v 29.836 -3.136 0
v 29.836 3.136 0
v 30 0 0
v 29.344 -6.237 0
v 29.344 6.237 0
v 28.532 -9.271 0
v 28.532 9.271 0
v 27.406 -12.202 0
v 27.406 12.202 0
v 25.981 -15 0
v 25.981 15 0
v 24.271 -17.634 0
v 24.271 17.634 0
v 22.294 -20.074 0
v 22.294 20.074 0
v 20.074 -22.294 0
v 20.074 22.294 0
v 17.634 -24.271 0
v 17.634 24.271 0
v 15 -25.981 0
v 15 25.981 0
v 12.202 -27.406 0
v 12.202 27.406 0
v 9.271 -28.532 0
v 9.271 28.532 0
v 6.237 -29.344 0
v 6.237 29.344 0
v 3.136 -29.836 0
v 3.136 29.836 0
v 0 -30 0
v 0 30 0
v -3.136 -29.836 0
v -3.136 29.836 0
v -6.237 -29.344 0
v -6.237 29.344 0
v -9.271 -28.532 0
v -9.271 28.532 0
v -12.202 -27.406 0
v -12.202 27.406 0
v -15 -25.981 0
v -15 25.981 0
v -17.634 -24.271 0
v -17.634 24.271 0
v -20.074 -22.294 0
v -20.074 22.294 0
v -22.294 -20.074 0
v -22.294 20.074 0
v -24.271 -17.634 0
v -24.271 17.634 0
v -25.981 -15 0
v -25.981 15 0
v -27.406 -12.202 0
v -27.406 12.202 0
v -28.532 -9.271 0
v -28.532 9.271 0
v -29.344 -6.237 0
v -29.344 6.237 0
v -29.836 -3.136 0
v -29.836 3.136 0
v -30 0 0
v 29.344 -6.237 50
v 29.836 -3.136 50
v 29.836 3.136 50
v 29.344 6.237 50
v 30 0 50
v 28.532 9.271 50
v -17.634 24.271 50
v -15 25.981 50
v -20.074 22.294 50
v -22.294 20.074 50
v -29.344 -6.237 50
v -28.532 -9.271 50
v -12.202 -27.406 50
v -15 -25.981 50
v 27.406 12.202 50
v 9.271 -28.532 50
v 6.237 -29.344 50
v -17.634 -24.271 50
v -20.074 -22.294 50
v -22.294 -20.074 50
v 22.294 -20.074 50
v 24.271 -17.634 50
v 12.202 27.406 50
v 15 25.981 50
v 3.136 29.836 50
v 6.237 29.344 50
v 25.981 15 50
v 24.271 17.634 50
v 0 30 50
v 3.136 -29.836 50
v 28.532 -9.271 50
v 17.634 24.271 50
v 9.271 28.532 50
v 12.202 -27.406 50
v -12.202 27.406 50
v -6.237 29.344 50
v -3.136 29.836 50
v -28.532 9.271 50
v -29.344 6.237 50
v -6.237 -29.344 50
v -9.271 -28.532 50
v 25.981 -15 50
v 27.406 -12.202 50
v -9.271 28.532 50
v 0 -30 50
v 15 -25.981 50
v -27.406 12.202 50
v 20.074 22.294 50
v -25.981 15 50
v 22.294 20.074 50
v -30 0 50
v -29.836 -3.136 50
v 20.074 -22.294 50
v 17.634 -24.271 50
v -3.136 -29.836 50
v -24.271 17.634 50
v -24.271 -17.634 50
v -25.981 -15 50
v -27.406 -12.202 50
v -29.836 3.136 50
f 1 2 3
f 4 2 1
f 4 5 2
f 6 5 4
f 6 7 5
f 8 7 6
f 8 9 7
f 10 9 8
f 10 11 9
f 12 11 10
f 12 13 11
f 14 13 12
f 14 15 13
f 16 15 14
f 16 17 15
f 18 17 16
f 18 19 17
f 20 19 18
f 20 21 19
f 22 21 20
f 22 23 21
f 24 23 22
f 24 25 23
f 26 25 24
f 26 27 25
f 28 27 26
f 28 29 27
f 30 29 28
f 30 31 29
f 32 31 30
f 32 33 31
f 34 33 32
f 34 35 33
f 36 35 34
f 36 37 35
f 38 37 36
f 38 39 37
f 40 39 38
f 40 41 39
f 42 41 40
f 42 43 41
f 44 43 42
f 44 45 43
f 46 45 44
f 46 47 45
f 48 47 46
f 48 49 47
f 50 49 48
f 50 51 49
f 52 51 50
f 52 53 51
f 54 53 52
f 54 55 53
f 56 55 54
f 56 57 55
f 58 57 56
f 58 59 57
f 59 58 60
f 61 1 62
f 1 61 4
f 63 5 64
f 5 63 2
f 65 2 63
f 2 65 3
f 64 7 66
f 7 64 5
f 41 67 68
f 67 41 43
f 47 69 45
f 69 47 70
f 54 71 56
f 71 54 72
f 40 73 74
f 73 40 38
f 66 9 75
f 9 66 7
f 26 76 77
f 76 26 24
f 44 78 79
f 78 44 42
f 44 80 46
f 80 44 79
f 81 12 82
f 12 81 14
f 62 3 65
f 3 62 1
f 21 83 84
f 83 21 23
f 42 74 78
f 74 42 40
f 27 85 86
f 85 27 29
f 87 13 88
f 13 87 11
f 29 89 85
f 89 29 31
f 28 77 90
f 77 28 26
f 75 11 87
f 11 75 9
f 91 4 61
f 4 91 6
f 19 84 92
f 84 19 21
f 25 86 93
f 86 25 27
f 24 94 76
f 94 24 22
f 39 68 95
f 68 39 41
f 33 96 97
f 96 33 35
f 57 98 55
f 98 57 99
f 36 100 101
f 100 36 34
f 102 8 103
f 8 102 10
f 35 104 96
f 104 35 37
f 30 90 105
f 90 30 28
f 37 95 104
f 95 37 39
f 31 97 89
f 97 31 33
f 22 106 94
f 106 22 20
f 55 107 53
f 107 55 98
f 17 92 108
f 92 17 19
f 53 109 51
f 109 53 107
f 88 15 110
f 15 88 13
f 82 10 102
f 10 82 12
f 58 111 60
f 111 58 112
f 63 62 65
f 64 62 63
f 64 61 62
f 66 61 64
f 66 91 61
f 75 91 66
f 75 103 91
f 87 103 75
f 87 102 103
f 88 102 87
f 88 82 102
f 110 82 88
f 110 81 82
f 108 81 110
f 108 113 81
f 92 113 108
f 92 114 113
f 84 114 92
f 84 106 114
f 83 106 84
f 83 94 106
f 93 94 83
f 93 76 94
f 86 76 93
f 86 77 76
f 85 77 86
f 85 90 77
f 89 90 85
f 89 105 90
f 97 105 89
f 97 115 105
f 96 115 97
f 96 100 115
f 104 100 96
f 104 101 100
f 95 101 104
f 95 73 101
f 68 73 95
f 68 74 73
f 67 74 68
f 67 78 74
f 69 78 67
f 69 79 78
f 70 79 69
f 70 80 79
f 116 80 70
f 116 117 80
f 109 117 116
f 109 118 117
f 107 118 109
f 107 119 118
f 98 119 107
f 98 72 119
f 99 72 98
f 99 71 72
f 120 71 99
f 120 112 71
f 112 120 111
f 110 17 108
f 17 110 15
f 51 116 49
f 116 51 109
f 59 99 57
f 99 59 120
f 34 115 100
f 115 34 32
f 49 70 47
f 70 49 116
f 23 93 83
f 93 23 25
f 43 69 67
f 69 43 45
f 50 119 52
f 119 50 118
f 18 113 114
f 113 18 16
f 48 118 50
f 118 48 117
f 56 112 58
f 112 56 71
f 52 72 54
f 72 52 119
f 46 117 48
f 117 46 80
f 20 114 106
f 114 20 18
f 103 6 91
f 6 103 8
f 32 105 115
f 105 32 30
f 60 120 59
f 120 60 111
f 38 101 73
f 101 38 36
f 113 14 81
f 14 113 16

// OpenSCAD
module screw(type = 2, r1 = 15, r2 = 20, n = 7, h = 100, t = 8)
{
	
	//			translate([-h/2,0,0]){
	linear_extrude(height = h, twist = 360*t/n, convexity = t)
	difference() {
		circle(r2);
		for (i = [0:n-1]) {
				if (type == 1) rotate(i*360/n) polygon([
						[ 2*r2, 0 ],
						[ r2, 0 ],
						[ r1*cos(180/n), r1*sin(180/n) ],
						[ r2*cos(360/n), r2*sin(360/n) ],
						[ 2*r2*cos(360/n), 2*r2*sin(360/n) ],
				]);
				if (type == 2) rotate(i*360/n) polygon([
						[ 2*r2, 0 ],
						[ r2, 0 ],
						[ r1*cos(90/n), r1*sin(90/n) ],
						[ r1*cos(180/n), r1*sin(180/n) ],
						[ r2*cos(270/n), r2*sin(270/n) ],
						[ 2*r2*cos(270/n), 2*r2*sin(270/n) ],
				]);
		}
	//}
}
}

module nut(type = 2, r1 = 16, r2 = 21, r3 = 30, s = 6, n = 7, h = 100/5, t = 8/5)
{
	difference() {
		cylinder($fn = s, r = r3, h = h);
		translate([ 0, 0, -h/2 ]) screw(type, r1, r2, n, h*2*5, t*2*10);
	}
}
module nut2(type = 2, r1 = 16, r2 = 21, r3 = 30, s = 6, n = 7, h = 100/5, t = 8/5)
{
	difference(){
union(){
	difference() {
	rotate([0,0,45])
		
		cylinder($fn = 4, r = r3, h = h);
		translate([ 0, 0, -h/2 ]) screw(type, r1, r2, n, h*2, t*2);
	}
	rotate([90,0,90])

translate([0,h/2,-h/2])
	difference() {
		cylinder($fn = s, r = r3, h = h);
		translate([ 0, 0, -h/2 ]) screw(type, r1, r2, n, h*2, t*2);

	}

	rotate([90,0,0])

translate([0,h/2,-h/2])
	difference() {
		cylinder($fn = s, r = r3, h = h);
		translate([ 0, 0, -h/2 ]) screw(type, r1, r2, n, h*2, t*2);

	}
}
	translate([ 0, 0, -h/2 ]) 
		screw(type, r1, r2, n, h*2, t*2);
	rotate([-90,0,0])
	translate([0, -h/2,-h/2])
	translate([ 0, 0, -h/2 ])
	screw(type, r1, r2, n, h*2, t*2);

	rotate([-90,0,90])
	translate([0, -h/2,-h/2])
	translate([ 0, 0, -h/2 ])
	screw(type, r1, r2, n, h*2, t*2);

	}
}
module spring(r1 = 100, r2 = 10, h = 100, hr = 12)
{
	stepsize = 1/16;
	module segment(i1, i2) {
		alpha1 = i1 * 360*r2/hr;
		alpha2 = i2 * 360*r2/hr;
		len1 = sin(acos(i1*2-1))*r2;
		len2 = sin(acos(i2*2-1))*r2;
		if (len1 < 0.01)
			polygon([
				[ cos(alpha1)*r1, sin(alpha1)*r1 ],
				[ cos(alpha2)*(r1-len2), sin(alpha2)*(r1-len2) ],
				[ cos(alpha2)*(r1+len2), sin(alpha2)*(r1+len2) ]
			]);
		if (len2 < 0.01)
			polygon([
				[ cos(alpha1)*(r1+len1), sin(alpha1)*(r1+len1) ],
				[ cos(alpha1)*(r1-len1), sin(alpha1)*(r1-len1) ],
				[ cos(alpha2)*r1, sin(alpha2)*r1 ],
			]);
		if (len1 >= 0.01 && len2 >= 0.01)
			polygon([
				[ cos(alpha1)*(r1+len1), sin(alpha1)*(r1+len1) ],
				[ cos(alpha1)*(r1-len1), sin(alpha1)*(r1-len1) ],
				[ cos(alpha2)*(r1-len2), sin(alpha2)*(r1-len2) ],
				[ cos(alpha2)*(r1+len2), sin(alpha2)*(r1+len2) ]
			]);
	}
	linear_extrude(height = 100, twist = 180*h/hr,
			$fn = (hr/r2)/stepsize, convexity = 5) {
		for (i = [ stepsize : stepsize : 1+stepsize/2 ])
			segment(i-stepsize, min(i, 1));
	}
}
/*
translate([ -30, 0, 0 ])
rotate([ 90, 0, 0 ])
scale([0.25,0.25,0.25])
screw();
*/
module stickScrew(l = [0,0,0],h=500,sh=100){
	translate(l){
		translate([ 0, 0, h ])
		screw(h=sh);
		cylinder($fn = 60, r = 20, h = h);
		translate([ 0, 0, -100])
		screw(h=sh);
	}
}
module stickScrew2(l = [0,0,0],h=500,sh=100){
	translate(l){
		translate([ 0, 0, h ])
		screw(h=sh);
		cylinder($fn = 60, r = 20, h = h);
		
	}
}


module example001()
{
	function r_from_dia(d) = d / 2;

	module rotcy(rot, r, h) {
		rotate(90, rot)
		//	scale([0.25,0.25,0.25])
				screw();
			//cylinder(r = r, h = h, center = true);
	}

	difference() {

		sphere(r = r_from_dia(size));
translate([0,0,-50])
		rotcy([0, 0, 0], cy_r, cy_h);
translate([0,50,0])
		rotcy([1, 0, 0], cy_r, cy_h);
translate([-50,0,0])
		rotcy([0, 1, 0], cy_r, cy_h);
	}

	size = 100;
	hole = 50;

	cy_r = r_from_dia(hole);
	cy_h = r_from_dia(size * 2.5);
}
//scale([0.15,0.15,0.15])
//example001();

//scale([0.13,0.13,0.13])
//screw();9
//rotate([0,0,0])\
module adapter(){
translate([0,0,-1])
	difference()
	{
		cylinder($fn = 60, r = 2, h = h-1);
		translate([-5,0.75,0])
		cube([10, 10, h], center = false);
	}
}
h=50;
//difference(){
//	cylinder($fn = 60, r = 3, h = h-5);
//	adapter();
//}
//scale(0.27,0.27,0.27)
//nut2(h=200,t=16,s=6,r3=50);
//translate([0,0,-26])

cylinder($fn = 60, r = 30, h = h);
scale(0.25,0.25,0.25)
stickScrew2(h=10);
/*
rotate([0,180,0])
difference(){
scale(0.25,0.25,0.25)
stickScrew2(h=10);
adapter();
}
*/
/*
difference(){
scale(0.25,0.25,0.25)

cylinder($fn = 60, r = 20, h = 6);
adapter();
}
*/
/*
translate([ 0, 0, 0 ]){
//size([30,0,0])

difference(){
union(){
nut();
translate([0,100,100])
rotate([90,0,0])
nut();
}

//screw(h=1000);
}
}
*/
